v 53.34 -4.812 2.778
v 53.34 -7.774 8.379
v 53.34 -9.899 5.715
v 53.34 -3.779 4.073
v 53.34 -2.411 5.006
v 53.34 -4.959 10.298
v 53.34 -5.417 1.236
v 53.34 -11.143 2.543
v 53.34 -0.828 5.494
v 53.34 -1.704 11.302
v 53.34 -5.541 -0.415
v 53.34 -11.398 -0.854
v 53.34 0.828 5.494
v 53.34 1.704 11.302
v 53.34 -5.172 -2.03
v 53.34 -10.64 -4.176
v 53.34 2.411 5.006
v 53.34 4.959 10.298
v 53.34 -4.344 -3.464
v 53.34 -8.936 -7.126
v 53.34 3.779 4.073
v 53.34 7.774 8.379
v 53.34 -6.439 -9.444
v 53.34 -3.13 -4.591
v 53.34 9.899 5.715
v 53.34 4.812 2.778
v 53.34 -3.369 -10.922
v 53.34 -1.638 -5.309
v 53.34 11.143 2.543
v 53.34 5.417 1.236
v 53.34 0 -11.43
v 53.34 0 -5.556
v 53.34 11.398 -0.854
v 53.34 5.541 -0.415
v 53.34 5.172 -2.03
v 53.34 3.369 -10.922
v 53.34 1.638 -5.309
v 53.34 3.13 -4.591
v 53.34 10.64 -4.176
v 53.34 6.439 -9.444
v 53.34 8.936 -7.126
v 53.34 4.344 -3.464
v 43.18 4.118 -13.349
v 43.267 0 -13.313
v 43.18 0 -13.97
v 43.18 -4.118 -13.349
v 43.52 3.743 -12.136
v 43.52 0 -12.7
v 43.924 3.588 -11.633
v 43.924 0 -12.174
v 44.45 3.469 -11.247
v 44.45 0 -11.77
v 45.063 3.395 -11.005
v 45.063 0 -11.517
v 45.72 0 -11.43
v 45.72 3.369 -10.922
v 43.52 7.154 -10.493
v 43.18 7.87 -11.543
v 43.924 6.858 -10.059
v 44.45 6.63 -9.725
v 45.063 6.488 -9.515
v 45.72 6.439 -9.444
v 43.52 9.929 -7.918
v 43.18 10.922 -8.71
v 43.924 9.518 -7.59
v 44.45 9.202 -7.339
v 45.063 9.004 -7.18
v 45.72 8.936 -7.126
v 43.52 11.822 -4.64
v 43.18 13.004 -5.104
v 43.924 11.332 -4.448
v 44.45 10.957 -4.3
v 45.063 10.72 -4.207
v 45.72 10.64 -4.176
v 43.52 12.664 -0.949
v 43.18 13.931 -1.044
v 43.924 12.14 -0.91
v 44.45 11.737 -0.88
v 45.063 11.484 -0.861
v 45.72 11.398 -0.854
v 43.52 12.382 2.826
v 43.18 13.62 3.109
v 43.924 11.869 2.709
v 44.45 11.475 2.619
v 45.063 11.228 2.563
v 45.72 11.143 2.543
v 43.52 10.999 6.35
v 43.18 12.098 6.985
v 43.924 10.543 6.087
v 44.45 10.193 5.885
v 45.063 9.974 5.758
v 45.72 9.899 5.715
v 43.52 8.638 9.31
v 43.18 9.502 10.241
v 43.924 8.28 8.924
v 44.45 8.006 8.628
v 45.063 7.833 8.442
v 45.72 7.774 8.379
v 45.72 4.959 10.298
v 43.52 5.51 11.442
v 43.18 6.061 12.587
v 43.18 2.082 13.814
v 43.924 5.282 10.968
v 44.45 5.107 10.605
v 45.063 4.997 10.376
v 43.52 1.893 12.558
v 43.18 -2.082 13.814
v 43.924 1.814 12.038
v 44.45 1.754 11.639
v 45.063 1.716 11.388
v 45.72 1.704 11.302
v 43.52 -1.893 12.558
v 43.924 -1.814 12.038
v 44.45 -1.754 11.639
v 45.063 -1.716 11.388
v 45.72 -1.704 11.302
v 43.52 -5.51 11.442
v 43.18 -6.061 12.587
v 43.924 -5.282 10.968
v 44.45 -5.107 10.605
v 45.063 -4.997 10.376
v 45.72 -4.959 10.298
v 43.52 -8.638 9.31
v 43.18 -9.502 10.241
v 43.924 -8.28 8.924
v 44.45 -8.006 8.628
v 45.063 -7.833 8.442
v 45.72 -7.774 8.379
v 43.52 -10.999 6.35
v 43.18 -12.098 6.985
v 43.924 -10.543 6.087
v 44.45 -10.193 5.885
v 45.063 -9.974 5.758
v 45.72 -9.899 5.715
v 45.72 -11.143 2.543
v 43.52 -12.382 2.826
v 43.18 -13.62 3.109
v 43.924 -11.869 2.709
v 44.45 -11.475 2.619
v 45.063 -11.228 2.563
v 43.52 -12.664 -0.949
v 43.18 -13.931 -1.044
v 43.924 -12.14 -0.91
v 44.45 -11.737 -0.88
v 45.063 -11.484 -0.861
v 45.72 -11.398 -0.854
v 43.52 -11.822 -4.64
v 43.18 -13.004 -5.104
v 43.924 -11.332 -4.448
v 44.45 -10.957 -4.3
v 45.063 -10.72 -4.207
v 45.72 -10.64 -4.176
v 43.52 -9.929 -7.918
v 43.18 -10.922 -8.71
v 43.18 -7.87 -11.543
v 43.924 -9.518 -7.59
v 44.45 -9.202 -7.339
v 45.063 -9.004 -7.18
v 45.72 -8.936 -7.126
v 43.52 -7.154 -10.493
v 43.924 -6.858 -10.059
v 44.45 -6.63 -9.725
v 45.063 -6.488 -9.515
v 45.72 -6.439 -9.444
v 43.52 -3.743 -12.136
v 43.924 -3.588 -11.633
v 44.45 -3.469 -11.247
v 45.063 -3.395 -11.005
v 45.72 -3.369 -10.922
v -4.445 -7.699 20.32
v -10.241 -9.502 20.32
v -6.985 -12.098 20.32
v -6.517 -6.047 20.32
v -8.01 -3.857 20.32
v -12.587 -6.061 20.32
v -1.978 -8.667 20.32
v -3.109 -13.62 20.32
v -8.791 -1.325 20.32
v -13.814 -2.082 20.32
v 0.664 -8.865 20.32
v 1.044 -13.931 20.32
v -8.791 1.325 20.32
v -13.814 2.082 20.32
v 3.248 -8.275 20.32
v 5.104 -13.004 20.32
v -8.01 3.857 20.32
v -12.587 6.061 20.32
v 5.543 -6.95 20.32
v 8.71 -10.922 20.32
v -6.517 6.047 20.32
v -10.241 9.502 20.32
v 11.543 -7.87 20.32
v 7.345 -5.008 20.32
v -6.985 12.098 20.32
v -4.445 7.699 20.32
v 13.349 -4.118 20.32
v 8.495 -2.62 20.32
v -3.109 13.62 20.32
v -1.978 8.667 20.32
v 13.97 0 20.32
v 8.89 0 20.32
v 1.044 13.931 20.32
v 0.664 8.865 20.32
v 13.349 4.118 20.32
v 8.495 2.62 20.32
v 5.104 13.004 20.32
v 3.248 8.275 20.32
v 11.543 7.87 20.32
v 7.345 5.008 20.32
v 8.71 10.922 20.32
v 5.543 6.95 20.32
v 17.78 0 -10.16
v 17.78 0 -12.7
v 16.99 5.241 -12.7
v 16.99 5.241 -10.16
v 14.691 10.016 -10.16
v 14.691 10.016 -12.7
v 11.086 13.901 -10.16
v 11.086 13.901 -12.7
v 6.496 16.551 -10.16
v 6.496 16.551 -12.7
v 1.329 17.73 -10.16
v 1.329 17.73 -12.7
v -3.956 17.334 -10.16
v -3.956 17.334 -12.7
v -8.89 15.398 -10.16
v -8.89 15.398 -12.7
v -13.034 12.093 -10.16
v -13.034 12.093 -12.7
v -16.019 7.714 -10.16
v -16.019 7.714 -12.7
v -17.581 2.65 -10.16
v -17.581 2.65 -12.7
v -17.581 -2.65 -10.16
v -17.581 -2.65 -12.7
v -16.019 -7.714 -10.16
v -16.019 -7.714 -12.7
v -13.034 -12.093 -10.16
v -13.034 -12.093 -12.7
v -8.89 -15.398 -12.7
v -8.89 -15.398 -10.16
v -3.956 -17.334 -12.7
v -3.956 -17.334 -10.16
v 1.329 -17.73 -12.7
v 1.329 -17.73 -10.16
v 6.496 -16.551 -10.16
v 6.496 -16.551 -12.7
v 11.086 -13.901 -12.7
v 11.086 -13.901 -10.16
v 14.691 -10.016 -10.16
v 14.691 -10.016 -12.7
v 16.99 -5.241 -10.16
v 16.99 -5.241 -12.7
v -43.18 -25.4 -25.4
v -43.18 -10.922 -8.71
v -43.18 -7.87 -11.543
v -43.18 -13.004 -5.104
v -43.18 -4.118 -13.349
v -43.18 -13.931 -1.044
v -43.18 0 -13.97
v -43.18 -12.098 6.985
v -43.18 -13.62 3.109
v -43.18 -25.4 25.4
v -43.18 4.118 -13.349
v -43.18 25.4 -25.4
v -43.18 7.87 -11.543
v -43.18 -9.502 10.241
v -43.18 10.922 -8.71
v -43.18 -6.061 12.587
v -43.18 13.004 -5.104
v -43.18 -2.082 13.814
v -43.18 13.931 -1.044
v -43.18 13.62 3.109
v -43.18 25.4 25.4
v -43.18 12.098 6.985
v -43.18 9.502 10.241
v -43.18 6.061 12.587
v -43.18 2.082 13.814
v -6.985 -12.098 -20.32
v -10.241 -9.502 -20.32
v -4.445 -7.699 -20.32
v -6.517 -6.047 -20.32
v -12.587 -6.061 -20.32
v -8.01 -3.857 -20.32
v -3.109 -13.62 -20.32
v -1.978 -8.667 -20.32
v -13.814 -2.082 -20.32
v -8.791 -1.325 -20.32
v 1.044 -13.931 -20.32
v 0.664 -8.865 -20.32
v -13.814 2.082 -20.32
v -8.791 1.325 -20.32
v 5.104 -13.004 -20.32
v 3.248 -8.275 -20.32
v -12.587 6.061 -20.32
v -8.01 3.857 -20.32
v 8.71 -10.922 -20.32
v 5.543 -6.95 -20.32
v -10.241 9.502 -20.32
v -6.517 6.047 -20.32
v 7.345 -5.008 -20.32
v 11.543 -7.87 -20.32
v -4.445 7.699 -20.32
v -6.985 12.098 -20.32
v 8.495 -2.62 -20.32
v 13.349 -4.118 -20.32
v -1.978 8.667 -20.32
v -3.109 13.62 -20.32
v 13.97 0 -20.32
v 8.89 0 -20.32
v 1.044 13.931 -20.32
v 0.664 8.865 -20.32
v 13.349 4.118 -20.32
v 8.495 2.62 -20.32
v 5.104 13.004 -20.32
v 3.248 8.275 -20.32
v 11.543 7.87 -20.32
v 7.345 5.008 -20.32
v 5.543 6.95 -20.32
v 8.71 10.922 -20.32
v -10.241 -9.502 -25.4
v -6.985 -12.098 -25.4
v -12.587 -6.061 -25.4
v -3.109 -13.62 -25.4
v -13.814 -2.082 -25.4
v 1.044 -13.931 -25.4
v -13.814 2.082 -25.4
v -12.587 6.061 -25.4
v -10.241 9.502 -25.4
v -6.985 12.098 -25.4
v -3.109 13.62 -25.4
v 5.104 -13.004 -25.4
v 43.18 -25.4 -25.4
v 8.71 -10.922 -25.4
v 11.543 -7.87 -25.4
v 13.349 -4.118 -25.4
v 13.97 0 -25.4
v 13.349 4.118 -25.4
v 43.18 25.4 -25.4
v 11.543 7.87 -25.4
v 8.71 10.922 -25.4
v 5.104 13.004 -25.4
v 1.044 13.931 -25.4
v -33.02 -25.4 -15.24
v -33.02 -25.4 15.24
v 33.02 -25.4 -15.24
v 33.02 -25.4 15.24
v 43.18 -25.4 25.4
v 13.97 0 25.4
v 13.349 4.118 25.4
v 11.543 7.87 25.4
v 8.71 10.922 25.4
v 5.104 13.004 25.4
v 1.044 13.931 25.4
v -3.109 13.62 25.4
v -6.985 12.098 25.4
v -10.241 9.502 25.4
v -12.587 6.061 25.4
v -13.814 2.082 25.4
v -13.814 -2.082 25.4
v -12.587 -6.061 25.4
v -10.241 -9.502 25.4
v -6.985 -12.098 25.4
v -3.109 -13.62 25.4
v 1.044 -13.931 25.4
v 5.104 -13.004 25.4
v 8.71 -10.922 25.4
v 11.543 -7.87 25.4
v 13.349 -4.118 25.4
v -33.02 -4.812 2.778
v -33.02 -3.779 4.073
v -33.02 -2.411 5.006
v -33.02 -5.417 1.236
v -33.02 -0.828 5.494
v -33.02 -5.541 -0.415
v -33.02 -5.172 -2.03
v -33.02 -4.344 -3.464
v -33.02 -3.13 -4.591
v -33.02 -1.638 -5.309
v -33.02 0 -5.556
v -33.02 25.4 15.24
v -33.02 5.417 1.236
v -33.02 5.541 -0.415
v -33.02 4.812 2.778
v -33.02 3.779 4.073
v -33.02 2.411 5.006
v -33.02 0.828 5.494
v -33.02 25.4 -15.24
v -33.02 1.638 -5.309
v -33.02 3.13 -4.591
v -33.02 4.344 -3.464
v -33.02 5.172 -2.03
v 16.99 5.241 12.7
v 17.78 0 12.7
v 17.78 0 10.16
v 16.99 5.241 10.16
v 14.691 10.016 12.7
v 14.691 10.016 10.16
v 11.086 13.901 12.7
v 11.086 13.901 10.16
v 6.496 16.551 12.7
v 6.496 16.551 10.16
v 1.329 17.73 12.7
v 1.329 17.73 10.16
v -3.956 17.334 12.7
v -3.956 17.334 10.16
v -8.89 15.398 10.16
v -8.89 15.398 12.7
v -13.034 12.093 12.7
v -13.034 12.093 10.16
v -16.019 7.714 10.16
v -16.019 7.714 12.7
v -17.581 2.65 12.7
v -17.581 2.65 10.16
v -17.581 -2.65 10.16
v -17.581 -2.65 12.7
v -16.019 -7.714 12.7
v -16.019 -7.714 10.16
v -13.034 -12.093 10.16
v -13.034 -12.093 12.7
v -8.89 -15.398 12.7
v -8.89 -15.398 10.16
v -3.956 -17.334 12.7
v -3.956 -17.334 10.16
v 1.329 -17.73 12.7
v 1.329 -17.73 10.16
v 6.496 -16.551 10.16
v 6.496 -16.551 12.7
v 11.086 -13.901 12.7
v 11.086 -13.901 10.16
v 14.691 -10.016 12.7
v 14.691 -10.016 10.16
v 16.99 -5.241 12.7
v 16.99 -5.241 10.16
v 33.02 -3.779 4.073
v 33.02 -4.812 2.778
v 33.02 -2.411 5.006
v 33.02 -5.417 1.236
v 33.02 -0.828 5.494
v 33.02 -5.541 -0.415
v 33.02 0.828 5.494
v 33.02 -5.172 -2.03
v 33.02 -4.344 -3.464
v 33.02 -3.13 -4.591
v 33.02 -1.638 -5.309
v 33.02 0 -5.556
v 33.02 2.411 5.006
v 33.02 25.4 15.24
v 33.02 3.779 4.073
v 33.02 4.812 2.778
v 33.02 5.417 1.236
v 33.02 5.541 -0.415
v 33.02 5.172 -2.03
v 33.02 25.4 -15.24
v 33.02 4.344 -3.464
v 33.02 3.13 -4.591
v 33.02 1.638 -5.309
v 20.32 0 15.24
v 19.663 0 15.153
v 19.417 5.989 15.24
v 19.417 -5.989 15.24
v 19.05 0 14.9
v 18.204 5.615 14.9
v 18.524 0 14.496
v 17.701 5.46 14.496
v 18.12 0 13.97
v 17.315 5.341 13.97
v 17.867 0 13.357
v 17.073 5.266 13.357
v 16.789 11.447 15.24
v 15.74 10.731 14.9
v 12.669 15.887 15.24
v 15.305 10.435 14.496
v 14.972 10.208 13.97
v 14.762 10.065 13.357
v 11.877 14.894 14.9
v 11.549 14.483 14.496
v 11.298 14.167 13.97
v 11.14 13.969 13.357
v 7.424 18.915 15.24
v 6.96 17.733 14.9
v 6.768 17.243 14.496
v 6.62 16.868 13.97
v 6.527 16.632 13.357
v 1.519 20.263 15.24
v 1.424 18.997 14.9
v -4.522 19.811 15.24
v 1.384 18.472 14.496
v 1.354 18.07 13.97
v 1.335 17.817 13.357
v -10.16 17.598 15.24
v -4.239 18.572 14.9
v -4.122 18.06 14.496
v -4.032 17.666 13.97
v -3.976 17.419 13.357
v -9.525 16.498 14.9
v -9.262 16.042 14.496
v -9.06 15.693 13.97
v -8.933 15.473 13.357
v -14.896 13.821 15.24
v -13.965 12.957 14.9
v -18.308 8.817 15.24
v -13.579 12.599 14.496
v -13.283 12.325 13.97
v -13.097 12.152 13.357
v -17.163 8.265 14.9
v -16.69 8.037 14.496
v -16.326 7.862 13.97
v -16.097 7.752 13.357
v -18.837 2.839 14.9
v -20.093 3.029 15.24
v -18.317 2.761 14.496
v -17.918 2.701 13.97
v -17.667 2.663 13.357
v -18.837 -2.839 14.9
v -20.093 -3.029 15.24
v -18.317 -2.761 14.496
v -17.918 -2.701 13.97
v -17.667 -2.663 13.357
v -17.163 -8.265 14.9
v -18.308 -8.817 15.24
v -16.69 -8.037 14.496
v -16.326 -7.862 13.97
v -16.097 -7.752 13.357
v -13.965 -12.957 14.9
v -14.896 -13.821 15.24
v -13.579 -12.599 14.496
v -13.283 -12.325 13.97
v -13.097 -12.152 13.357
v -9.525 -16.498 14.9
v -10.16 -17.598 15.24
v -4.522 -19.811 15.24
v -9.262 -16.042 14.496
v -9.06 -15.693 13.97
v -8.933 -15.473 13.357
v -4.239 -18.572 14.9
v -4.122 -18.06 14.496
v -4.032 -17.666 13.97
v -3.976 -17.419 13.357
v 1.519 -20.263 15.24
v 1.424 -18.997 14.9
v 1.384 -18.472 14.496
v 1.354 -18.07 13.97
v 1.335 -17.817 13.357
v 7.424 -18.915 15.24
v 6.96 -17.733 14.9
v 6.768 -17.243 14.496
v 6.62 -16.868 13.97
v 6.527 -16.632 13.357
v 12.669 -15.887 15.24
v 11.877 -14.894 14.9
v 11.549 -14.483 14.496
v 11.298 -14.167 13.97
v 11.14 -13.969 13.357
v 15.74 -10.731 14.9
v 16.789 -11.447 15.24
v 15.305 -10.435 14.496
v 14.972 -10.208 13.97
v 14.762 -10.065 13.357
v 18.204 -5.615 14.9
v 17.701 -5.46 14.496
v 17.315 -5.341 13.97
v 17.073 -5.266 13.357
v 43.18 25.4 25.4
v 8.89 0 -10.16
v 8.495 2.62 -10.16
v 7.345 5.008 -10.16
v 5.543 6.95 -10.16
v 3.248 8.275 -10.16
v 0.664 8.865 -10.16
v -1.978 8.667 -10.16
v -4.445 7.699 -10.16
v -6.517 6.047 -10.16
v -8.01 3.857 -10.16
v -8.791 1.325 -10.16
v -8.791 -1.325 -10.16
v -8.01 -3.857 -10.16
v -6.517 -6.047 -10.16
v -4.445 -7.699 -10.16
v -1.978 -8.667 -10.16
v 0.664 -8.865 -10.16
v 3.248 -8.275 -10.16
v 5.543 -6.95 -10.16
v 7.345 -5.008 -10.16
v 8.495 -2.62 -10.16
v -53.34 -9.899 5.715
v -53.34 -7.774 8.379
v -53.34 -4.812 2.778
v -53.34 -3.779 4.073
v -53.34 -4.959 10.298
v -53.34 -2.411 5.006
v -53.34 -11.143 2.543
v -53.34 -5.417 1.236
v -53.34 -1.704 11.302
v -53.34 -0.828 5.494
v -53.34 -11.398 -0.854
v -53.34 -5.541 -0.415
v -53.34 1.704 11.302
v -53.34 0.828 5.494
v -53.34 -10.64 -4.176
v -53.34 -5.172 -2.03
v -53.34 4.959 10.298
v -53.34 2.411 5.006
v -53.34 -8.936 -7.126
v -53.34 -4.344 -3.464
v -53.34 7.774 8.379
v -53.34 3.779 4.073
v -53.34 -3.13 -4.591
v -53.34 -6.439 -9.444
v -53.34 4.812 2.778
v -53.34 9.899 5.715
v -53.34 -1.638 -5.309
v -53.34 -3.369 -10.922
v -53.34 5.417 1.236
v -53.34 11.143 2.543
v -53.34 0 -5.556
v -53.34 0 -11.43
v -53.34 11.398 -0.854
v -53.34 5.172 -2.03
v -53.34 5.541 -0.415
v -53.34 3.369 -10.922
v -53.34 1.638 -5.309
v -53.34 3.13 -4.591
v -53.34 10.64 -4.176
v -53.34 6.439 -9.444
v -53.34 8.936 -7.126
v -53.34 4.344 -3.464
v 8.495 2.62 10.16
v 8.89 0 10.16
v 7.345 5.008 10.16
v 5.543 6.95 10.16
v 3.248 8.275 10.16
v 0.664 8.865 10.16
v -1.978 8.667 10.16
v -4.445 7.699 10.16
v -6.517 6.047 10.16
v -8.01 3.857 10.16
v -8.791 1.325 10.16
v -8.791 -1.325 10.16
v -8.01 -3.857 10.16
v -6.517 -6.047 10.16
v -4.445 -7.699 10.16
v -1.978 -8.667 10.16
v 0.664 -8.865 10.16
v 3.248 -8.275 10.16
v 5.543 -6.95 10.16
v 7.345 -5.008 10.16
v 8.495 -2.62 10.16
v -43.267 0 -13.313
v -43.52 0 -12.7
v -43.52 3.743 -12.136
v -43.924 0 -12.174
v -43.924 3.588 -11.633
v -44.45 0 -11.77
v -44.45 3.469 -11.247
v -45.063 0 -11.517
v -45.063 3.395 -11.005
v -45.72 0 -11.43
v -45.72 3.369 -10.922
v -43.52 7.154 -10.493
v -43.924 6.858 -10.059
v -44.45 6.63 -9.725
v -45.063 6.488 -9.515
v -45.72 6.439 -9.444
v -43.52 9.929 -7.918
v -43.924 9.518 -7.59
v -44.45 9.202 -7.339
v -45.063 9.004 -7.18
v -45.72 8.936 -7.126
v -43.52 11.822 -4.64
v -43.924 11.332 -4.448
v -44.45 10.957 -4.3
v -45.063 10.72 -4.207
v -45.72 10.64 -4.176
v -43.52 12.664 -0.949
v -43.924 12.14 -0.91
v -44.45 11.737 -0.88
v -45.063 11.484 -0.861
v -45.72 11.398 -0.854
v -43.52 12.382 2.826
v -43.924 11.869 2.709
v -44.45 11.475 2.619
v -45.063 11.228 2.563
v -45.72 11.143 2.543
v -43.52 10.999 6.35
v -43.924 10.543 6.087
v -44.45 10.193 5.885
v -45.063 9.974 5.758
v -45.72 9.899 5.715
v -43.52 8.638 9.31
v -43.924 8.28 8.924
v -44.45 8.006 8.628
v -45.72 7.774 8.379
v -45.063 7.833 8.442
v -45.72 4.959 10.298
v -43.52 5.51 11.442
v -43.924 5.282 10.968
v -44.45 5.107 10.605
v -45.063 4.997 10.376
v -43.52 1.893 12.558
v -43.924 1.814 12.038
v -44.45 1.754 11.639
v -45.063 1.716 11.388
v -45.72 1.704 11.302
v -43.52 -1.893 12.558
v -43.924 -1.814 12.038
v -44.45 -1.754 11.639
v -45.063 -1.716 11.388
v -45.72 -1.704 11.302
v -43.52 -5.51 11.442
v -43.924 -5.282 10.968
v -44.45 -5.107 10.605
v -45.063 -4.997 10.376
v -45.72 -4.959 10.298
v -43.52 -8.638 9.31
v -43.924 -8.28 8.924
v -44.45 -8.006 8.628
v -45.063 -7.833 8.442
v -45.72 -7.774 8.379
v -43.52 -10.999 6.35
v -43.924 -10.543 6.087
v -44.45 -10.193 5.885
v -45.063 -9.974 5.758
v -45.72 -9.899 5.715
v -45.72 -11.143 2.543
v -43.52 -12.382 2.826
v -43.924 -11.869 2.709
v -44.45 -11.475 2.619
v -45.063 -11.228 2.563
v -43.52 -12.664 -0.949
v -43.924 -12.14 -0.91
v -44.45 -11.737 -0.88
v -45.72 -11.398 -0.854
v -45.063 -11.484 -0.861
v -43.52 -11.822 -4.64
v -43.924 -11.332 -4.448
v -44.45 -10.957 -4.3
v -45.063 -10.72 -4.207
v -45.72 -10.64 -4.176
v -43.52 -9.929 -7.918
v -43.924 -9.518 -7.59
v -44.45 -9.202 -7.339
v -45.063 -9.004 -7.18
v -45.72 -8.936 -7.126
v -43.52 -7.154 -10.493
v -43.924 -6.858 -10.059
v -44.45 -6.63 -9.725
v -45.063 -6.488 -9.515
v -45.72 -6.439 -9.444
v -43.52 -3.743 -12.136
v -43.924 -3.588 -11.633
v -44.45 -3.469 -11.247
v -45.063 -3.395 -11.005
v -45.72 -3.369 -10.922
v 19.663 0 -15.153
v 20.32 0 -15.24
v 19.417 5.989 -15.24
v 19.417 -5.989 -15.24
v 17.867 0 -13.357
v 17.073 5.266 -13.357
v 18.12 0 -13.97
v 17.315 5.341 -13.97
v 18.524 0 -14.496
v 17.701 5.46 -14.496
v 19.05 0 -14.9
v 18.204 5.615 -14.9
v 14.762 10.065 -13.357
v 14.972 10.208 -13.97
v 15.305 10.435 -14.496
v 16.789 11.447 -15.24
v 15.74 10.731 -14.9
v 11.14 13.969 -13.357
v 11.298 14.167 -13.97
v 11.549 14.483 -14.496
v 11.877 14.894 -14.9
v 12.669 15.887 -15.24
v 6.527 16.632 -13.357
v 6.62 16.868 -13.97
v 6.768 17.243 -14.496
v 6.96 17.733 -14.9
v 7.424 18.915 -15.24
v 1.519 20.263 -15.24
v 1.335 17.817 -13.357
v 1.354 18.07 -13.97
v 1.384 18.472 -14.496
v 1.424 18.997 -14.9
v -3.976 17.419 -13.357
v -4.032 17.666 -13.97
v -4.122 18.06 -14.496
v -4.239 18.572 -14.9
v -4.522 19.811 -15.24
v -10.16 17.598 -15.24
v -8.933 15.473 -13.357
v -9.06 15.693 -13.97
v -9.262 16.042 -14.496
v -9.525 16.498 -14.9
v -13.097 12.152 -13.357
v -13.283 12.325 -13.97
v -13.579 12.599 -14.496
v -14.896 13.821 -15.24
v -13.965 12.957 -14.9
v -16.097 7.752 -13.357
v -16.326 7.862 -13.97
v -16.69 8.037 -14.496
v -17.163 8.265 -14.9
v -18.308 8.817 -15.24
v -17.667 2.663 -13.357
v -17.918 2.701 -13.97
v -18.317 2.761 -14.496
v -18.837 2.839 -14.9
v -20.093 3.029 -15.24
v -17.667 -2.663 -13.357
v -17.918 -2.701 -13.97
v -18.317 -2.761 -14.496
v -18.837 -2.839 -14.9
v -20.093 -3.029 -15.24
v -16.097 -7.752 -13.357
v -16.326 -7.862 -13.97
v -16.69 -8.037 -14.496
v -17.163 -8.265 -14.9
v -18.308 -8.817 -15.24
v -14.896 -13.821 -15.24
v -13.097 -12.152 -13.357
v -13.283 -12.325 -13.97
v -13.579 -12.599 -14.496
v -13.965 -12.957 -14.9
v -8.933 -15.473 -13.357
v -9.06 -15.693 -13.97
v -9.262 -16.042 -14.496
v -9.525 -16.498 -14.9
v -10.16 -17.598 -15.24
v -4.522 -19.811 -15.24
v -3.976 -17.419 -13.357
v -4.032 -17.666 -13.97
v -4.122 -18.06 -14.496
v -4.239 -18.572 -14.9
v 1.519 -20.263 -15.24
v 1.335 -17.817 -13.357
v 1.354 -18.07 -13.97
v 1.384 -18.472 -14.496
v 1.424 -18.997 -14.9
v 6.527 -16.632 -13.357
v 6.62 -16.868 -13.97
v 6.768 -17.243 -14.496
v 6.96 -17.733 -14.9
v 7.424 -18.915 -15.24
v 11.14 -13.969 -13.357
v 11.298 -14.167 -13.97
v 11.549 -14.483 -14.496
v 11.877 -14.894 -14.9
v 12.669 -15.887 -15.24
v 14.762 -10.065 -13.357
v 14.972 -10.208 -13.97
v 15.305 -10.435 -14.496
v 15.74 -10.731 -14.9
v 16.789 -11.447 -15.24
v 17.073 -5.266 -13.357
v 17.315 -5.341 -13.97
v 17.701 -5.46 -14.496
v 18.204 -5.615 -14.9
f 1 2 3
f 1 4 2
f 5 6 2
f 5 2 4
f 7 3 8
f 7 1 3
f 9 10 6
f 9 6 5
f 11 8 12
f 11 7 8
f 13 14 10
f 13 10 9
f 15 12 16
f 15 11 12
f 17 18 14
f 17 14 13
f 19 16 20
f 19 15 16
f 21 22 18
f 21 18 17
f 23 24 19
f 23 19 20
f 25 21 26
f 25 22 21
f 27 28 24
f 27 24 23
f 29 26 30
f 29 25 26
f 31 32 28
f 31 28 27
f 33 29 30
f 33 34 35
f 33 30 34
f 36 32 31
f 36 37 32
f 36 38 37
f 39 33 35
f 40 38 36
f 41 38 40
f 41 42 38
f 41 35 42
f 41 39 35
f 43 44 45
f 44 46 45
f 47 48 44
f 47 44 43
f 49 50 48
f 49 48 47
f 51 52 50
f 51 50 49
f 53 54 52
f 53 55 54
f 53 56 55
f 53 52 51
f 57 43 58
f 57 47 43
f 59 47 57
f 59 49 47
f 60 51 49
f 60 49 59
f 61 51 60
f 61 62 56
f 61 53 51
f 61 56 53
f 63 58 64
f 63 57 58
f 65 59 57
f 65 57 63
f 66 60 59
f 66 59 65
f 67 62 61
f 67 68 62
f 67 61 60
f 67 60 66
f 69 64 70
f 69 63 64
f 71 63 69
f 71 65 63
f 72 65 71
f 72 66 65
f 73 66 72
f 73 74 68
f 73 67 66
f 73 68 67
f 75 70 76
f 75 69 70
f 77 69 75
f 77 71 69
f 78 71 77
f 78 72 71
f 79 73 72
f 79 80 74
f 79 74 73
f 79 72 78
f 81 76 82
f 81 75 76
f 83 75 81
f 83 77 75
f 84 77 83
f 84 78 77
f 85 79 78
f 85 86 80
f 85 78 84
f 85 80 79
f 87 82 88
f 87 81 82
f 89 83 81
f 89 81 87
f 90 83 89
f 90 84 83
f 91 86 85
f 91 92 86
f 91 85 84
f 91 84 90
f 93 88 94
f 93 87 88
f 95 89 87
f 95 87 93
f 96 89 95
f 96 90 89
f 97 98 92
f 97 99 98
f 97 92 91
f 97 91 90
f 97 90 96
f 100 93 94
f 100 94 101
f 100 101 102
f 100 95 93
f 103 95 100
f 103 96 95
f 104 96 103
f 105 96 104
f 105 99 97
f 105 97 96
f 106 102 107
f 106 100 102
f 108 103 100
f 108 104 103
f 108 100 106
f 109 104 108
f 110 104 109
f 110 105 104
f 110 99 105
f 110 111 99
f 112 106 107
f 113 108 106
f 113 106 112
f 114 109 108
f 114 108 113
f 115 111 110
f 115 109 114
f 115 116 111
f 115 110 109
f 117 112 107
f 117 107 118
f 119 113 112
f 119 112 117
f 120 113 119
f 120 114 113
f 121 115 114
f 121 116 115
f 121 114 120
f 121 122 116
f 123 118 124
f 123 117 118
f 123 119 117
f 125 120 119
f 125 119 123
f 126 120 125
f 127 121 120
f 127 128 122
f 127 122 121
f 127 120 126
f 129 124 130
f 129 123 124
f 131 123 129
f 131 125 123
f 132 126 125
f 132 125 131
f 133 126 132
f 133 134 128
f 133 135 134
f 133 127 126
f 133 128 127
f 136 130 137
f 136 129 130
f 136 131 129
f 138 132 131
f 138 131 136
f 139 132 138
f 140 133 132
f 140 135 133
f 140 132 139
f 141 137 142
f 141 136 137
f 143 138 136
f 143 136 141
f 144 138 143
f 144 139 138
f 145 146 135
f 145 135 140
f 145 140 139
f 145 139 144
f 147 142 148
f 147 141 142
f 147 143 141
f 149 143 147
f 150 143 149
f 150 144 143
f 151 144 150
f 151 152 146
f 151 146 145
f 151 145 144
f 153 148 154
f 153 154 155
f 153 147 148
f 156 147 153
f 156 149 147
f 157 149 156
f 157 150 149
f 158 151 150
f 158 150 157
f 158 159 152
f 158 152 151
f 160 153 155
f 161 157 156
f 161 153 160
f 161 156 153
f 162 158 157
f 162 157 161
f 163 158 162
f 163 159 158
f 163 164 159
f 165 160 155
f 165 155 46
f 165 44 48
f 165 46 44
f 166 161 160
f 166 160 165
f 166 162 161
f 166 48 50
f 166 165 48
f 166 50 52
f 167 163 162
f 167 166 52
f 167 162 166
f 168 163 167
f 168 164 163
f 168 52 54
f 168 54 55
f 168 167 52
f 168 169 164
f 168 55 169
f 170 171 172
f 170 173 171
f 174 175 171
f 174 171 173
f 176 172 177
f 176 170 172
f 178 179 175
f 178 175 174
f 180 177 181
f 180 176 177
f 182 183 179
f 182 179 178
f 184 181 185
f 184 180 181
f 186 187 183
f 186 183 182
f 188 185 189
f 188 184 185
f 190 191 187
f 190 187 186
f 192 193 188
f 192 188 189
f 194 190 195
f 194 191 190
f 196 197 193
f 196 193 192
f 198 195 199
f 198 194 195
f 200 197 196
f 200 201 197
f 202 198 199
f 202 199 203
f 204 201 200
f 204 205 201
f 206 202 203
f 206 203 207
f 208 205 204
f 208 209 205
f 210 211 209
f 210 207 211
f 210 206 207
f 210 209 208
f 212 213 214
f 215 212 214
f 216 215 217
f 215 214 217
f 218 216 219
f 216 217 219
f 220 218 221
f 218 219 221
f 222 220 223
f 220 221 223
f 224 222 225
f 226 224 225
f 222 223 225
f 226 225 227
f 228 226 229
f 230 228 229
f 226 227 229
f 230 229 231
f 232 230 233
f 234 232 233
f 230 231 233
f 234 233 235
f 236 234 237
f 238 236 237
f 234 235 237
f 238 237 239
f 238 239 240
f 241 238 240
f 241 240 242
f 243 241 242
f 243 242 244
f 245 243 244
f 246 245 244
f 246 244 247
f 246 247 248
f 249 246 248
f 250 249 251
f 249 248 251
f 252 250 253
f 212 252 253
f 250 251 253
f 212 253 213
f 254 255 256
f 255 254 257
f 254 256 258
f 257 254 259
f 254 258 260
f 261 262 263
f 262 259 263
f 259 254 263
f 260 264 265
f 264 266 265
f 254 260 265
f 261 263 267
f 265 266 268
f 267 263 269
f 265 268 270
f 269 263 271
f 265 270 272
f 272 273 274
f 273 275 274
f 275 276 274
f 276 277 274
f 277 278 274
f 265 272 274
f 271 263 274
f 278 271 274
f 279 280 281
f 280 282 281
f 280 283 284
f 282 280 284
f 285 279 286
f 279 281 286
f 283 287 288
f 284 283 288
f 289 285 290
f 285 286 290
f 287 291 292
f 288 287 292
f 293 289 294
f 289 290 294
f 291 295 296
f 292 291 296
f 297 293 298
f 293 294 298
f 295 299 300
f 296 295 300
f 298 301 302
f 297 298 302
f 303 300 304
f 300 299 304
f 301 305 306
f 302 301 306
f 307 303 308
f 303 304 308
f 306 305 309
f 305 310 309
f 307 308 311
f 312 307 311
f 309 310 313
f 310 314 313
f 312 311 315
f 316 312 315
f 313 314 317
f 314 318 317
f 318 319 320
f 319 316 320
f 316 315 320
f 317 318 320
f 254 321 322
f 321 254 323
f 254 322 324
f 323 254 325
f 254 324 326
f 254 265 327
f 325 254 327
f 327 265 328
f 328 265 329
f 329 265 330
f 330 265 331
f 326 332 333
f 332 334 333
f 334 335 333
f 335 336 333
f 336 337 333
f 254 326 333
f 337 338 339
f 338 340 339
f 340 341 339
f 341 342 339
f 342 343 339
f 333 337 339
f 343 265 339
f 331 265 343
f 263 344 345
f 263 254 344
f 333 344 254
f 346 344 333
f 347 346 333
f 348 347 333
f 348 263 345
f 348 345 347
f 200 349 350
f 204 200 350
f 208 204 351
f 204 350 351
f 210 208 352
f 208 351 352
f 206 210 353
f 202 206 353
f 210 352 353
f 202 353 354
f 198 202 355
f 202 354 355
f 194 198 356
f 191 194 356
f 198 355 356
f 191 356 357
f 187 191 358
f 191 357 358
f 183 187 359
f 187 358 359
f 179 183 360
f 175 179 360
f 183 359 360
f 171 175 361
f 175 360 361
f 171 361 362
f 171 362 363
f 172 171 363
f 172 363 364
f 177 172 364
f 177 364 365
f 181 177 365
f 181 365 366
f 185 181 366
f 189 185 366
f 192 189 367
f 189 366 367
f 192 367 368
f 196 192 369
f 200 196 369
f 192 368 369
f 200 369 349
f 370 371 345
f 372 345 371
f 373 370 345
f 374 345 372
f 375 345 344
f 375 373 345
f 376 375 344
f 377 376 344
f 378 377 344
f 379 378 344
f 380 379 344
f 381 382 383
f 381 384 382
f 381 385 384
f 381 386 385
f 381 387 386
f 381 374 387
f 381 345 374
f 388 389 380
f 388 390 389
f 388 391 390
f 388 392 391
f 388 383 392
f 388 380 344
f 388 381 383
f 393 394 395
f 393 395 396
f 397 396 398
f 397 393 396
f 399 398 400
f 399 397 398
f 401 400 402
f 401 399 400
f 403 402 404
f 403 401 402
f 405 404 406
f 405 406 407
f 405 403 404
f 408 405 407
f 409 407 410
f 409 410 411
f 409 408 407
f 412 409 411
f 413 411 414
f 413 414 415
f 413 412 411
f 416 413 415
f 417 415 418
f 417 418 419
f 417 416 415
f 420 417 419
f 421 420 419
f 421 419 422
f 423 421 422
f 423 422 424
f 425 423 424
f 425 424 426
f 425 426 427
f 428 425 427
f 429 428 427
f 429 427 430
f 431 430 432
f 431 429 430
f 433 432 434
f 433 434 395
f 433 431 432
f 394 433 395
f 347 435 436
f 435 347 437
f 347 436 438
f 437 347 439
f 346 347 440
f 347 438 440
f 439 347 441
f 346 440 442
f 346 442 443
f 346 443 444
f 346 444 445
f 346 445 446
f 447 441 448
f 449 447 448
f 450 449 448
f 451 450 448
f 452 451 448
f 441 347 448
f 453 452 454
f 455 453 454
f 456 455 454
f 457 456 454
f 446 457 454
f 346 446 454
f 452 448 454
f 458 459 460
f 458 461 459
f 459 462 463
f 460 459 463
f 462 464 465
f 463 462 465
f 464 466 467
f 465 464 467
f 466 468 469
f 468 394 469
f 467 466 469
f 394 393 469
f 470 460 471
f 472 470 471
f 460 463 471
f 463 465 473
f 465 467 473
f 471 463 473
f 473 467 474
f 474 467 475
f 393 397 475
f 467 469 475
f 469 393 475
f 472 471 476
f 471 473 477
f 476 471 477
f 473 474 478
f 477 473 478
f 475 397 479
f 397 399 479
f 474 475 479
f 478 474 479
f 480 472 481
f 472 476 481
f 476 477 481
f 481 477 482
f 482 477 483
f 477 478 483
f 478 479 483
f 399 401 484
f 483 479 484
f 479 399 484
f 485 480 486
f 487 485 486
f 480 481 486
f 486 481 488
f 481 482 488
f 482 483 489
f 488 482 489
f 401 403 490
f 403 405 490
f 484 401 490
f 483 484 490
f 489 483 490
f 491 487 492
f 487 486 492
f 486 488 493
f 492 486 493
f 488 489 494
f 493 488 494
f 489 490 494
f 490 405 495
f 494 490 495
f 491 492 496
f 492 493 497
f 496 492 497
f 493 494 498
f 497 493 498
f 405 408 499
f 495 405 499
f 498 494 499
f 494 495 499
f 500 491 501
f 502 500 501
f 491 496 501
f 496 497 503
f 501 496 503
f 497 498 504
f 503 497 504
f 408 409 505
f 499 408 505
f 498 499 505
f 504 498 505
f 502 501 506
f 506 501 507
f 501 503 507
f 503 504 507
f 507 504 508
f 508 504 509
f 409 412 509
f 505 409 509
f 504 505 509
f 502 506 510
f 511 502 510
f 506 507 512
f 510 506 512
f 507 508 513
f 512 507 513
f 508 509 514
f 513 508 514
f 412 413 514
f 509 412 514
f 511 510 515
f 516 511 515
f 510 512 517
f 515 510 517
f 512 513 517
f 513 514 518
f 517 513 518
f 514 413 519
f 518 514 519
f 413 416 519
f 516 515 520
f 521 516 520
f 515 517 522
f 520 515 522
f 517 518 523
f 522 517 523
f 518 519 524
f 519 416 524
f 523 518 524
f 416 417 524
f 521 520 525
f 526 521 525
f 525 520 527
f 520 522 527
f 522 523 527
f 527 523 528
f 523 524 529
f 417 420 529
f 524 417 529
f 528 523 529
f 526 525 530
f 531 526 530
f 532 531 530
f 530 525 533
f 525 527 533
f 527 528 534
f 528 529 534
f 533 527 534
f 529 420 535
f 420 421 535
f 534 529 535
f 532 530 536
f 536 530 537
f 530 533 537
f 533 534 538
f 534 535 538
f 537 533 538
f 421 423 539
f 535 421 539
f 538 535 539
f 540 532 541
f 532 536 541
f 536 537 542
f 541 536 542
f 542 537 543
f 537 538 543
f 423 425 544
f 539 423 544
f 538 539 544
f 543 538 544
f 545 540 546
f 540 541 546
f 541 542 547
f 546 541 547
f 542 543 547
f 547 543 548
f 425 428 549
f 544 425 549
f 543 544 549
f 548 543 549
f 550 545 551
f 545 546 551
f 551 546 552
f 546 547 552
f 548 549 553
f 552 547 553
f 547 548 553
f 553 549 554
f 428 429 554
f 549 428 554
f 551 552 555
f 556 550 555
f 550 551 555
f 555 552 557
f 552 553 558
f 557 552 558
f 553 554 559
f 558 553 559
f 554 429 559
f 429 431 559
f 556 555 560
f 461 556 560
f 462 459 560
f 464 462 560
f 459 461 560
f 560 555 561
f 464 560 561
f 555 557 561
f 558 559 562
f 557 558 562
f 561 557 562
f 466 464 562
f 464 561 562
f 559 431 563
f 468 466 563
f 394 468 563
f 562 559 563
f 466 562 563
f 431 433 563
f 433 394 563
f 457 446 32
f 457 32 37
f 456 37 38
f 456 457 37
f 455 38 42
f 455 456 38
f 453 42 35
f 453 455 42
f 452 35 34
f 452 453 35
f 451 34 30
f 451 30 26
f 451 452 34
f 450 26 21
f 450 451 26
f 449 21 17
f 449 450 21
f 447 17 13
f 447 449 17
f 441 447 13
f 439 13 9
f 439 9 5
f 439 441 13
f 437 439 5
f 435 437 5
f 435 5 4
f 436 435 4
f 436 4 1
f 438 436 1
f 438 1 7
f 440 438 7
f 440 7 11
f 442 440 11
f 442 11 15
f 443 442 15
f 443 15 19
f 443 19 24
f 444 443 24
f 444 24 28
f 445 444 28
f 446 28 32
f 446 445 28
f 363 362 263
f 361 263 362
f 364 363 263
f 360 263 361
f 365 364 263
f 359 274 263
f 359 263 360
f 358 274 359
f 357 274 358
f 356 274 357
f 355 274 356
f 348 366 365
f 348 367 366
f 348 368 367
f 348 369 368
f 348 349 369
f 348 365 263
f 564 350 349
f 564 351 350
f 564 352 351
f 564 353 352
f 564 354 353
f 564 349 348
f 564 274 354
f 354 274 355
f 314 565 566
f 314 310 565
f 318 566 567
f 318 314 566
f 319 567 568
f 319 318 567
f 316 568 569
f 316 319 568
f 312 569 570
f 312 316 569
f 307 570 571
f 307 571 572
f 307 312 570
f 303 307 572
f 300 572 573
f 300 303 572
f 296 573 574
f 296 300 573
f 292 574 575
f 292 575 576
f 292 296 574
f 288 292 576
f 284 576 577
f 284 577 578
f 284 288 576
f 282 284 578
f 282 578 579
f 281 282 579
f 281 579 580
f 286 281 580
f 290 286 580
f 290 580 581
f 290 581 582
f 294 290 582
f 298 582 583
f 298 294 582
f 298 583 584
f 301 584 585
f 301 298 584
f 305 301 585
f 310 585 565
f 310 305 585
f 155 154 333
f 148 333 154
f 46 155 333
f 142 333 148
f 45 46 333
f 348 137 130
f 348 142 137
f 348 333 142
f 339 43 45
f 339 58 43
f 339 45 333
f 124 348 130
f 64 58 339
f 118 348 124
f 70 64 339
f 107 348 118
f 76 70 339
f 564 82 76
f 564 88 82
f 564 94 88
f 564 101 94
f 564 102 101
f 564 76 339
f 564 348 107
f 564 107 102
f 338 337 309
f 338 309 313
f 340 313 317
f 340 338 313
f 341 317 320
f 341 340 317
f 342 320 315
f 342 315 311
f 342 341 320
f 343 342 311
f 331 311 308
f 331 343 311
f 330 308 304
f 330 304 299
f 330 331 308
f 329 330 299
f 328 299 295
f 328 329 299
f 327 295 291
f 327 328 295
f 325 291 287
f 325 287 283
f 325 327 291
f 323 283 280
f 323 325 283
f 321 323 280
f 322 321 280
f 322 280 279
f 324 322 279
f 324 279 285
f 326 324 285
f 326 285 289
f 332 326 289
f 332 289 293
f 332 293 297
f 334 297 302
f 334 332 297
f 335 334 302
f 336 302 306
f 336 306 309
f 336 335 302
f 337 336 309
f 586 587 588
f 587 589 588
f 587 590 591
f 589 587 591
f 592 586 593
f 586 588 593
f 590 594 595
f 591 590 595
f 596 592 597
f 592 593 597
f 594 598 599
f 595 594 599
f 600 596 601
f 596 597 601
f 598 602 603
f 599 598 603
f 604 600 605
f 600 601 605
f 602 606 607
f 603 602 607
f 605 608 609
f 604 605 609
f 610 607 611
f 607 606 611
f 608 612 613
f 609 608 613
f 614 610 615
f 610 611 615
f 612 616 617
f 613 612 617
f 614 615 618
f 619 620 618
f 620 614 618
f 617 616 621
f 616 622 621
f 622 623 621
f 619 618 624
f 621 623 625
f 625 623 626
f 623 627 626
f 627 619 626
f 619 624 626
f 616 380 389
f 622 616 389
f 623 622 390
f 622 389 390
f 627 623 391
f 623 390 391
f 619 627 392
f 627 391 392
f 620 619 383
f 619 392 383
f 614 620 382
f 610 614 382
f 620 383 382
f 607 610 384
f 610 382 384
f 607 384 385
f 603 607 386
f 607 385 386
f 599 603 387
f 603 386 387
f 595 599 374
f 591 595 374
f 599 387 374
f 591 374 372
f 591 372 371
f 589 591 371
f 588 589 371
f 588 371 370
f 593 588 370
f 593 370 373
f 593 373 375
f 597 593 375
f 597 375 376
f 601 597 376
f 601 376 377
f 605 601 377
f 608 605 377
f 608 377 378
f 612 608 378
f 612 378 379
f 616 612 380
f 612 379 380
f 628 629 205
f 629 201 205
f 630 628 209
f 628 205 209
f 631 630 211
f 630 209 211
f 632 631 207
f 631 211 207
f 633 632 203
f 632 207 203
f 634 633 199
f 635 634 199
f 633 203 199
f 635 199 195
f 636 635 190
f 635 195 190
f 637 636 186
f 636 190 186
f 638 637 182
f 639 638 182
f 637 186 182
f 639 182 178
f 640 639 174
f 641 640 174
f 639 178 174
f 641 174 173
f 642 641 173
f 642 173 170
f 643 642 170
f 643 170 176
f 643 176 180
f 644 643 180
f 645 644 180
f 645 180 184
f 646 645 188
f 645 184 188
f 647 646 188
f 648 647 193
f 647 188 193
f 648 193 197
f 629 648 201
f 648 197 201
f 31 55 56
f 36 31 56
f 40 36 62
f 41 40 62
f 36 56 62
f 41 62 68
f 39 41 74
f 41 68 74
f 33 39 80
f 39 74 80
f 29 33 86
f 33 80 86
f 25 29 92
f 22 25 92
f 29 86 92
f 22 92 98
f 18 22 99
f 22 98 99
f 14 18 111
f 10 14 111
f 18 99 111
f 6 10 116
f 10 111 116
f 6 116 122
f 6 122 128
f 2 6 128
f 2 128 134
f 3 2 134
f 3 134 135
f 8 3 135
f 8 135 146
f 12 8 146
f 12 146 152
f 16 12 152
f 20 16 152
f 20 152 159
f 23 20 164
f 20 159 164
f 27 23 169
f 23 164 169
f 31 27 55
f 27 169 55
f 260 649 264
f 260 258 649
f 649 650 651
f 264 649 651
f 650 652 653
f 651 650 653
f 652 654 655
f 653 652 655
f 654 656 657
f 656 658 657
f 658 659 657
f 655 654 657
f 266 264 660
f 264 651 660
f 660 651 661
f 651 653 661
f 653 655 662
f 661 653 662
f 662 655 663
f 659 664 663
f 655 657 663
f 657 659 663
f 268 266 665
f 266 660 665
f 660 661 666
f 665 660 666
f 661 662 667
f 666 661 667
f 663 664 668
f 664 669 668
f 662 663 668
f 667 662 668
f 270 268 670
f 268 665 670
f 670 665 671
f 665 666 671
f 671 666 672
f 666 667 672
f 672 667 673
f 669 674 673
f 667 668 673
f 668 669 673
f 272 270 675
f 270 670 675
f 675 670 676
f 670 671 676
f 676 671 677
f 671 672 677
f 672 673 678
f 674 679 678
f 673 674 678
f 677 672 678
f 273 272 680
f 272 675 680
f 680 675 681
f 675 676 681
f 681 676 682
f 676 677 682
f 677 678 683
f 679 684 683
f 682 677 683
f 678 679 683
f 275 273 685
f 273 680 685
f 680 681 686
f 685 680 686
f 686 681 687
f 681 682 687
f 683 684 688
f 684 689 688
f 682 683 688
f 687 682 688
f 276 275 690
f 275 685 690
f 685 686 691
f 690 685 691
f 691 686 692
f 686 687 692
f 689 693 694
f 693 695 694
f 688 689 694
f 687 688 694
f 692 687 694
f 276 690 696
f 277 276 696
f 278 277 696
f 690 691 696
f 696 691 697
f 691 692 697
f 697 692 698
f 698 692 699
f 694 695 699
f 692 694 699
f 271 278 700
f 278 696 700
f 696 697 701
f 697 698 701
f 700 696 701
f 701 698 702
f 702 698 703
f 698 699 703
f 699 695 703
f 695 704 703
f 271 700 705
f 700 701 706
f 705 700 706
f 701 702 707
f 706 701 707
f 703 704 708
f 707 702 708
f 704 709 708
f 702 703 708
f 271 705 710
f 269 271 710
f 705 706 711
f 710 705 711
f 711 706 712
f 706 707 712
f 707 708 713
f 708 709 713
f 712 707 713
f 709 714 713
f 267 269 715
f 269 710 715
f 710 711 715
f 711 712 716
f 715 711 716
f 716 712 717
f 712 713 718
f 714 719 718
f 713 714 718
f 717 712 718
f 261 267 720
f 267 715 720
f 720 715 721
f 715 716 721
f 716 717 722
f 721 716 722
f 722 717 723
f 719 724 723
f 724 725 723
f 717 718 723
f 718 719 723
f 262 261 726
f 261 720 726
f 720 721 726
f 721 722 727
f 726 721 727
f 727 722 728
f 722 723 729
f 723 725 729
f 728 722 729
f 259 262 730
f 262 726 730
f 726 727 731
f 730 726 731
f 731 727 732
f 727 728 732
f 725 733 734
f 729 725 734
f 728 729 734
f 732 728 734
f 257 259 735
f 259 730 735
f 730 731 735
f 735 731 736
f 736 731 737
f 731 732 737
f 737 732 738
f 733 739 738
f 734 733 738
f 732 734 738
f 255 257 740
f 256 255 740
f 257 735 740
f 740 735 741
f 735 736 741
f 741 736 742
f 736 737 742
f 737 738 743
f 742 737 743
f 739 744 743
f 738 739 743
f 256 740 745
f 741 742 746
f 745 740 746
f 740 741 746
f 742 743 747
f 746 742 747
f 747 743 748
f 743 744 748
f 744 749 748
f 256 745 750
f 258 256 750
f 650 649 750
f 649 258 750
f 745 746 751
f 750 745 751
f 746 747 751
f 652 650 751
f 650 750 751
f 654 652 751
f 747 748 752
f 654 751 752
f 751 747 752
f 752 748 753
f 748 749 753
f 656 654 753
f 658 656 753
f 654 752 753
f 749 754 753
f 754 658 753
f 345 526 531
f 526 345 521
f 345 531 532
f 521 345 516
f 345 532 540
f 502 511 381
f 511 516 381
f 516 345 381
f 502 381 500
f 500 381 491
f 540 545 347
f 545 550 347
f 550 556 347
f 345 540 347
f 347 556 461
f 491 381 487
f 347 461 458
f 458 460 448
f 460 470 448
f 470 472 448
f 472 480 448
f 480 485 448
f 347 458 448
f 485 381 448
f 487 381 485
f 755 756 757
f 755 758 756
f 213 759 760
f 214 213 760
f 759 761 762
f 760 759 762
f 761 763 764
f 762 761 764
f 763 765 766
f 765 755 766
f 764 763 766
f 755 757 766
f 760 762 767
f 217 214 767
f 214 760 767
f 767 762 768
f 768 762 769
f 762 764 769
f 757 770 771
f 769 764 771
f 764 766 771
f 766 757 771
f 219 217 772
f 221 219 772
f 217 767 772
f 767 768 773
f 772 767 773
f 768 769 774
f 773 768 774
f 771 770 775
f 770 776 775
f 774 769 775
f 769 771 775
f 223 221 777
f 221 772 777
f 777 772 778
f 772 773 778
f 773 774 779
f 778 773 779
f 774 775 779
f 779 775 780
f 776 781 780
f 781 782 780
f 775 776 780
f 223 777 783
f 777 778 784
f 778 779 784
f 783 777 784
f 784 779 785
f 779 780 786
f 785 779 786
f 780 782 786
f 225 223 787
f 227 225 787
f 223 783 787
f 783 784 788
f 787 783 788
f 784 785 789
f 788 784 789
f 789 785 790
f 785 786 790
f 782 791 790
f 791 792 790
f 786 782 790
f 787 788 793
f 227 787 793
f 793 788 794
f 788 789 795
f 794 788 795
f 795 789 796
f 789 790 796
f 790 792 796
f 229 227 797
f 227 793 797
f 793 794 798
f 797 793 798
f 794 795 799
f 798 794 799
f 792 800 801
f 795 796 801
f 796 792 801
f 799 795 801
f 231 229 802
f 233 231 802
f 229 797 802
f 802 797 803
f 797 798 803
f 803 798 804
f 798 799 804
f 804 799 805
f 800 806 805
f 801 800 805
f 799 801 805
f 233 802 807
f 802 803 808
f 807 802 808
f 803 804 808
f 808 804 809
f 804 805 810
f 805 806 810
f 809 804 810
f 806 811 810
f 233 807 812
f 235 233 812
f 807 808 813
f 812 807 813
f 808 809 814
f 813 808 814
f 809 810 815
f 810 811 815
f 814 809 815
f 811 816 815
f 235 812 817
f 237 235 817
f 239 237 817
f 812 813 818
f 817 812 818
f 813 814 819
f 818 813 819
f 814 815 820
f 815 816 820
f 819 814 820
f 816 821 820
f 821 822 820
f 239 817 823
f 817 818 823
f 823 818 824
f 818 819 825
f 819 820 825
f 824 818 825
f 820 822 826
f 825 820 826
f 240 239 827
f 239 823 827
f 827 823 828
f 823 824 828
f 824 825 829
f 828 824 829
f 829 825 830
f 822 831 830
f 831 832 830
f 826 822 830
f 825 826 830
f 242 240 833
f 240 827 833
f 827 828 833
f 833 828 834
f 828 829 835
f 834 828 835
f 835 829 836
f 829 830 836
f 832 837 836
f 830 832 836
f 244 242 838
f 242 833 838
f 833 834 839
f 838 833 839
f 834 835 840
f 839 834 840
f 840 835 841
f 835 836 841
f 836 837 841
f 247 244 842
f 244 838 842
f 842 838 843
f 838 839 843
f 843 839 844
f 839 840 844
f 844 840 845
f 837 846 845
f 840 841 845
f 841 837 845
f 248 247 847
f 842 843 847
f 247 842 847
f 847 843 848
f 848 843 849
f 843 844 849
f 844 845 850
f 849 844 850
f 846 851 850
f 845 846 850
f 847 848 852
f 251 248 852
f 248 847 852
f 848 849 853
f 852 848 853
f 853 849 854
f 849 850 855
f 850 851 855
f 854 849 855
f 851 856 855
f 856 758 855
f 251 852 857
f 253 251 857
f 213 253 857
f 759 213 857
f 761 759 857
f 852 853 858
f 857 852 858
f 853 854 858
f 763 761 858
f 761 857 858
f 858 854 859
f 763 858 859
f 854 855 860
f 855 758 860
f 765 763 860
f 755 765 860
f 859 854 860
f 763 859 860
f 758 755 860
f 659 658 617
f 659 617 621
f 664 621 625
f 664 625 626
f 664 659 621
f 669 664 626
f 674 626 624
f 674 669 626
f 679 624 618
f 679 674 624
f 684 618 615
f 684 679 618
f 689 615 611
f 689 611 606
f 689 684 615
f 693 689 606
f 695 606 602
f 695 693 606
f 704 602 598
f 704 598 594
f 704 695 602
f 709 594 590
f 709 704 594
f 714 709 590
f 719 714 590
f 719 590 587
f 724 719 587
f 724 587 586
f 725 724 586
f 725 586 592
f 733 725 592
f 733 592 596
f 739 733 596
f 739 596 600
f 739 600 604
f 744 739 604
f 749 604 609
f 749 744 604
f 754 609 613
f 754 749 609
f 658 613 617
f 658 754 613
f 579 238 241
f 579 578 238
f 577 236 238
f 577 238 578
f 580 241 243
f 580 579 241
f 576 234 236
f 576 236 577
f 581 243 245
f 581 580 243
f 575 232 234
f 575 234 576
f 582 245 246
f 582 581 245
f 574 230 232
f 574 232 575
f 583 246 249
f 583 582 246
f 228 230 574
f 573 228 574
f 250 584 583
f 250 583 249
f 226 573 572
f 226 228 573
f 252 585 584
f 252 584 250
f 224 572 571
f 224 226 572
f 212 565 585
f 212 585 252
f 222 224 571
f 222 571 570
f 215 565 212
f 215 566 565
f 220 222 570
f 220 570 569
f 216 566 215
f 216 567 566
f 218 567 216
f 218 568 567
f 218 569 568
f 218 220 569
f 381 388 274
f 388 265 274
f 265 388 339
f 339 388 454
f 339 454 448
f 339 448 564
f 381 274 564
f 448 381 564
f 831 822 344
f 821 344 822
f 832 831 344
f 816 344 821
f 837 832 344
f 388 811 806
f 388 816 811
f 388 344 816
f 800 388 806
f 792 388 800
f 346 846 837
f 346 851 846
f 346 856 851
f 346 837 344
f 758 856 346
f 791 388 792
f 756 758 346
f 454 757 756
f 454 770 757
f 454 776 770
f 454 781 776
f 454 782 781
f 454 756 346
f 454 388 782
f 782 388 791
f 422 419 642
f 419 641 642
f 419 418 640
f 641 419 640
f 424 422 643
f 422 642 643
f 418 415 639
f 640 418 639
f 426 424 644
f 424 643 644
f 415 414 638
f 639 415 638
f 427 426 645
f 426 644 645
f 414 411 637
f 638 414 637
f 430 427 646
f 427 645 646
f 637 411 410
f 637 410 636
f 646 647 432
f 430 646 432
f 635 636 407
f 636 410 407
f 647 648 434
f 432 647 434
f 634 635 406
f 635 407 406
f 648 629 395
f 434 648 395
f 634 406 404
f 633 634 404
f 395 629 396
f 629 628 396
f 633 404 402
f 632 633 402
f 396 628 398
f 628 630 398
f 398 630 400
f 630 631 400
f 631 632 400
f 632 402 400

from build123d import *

# Parameters (mm, degrees)
SKETCH1_W           = 86.36
SKETCH1_H           = 50.8
SKETCH1_R           = 8.89
BOSS_EXTRUDE2_DEPTH = 25.4
CUT_EXTRUDE2_START  = 25.4
SKETCH1_3_R         = 13.97
SKETCH1_3_R_2       = 8.89
CUT_EXTRUDE2_DEPTH  = 5.08
CUT_EXTRUDE4_START  = -25.4
SKETCH1_4_R         = 13.97
SKETCH1_4_R_2       = 8.89
CUT_EXTRUDE4_DEPTH  = 5.08
SKETCH3_R           = 11.43
SKETCH3_R_2         = 5.55625
BOSS_EXTRUDE3_DEPTH = 10.16
SKETCH3_2_R         = 5.55625
CUT_EXTRUDE5_DEPTH  = 97.52
SKETCH4_W           = 66.04
SKETCH4_H           = 30.48
CUT_EXTRUDE6_DEPTH  = 51.8
BOSS_EXTRUDE4_START = 15.24
SKETCH5_R           = 17.78
SKETCH5_R_2         = 8.89
BOSS_EXTRUDE4_DEPTH = 5.08
BOSS_EXTRUDE5_START = -15.24
SKETCH5_2_R         = 17.78
SKETCH5_2_R_2       = 8.89
BOSS_EXTRUDE5_DEPTH = 5.08
FILLET1_R           = 2.54
FILLET2_R           = 2.54


with BuildPart() as part:
    # Sketch1 → Boss-Extrude2 (new body, symmetric)
    with BuildSketch(Plane.XY):
        Rectangle(SKETCH1_W, SKETCH1_H)
        Circle(SKETCH1_R, mode=Mode.SUBTRACT)
    extrude(amount=BOSS_EXTRUDE2_DEPTH, both=True)

    # Sketch1<3> → Cut-Extrude2 (cut)
    with BuildSketch(Plane.XY.offset(CUT_EXTRUDE2_START)):
        Circle(SKETCH1_3_R)
        Circle(SKETCH1_3_R_2, mode=Mode.SUBTRACT)
    extrude(amount=-CUT_EXTRUDE2_DEPTH, mode=Mode.SUBTRACT)

    # Sketch1<4> → Cut-Extrude4 (cut)
    with BuildSketch(Plane.XY.offset(CUT_EXTRUDE4_START)):
        Circle(SKETCH1_4_R)
        Circle(SKETCH1_4_R_2, mode=Mode.SUBTRACT)
    extrude(amount=CUT_EXTRUDE4_DEPTH, mode=Mode.SUBTRACT)

    # Sketch3 → Boss-Extrude3 (add)
    with BuildSketch(Plane(origin=(43.18, 0, 0), x_dir=(0, 0, -1), z_dir=(1, 0, 0))):
        Circle(SKETCH3_R)
        Circle(SKETCH3_R_2, mode=Mode.SUBTRACT)
    boss_extrude3 = extrude(amount=BOSS_EXTRUDE3_DEPTH)

    # Mirror1: Boss-Extrude3 across plane
    add(boss_extrude3.mirror(Plane(origin=(0, 0, 0), x_dir=(0, 0, 1), z_dir=(1, 0, 0))))

    # Sketch3<2> → Cut-Extrude5 (cut, through all)
    with BuildSketch(Plane(origin=(43.18, 0, 0), x_dir=(0, 0, -1), z_dir=(1, 0, 0))):
        Circle(SKETCH3_2_R)
    extrude(amount=-CUT_EXTRUDE5_DEPTH, mode=Mode.SUBTRACT)

    # Sketch4 → Cut-Extrude6 (cut, through all)
    with BuildSketch(Plane(origin=(0, 25.4, 0), x_dir=(1, 0, 0), z_dir=(0, 1, 0))):
        Rectangle(SKETCH4_W, SKETCH4_H)
    extrude(amount=-CUT_EXTRUDE6_DEPTH, mode=Mode.SUBTRACT)

    # Sketch5 → Boss-Extrude4 (add)
    with BuildSketch(Plane.XY.offset(BOSS_EXTRUDE4_START)):
        Circle(SKETCH5_R)
        Circle(SKETCH5_R_2, mode=Mode.SUBTRACT)
    extrude(amount=-BOSS_EXTRUDE4_DEPTH)

    # Sketch5<2> → Boss-Extrude5 (add)
    with BuildSketch(Plane.XY.offset(BOSS_EXTRUDE5_START)):
        Circle(SKETCH5_2_R)
        Circle(SKETCH5_2_R_2, mode=Mode.SUBTRACT)
    extrude(amount=BOSS_EXTRUDE5_DEPTH)

    # Fillet1
    fillet1_edges = [part.edges().sort_by_distance(p)[0] for p in [
        (-17.78, 0, 15.24),
        (-17.78, 0, -15.24),
    ]]
    fillet(fillet1_edges, radius=FILLET1_R)

    # Fillet2
    fillet2_edges = [part.edges().sort_by_distance(p)[0] for p in [
        (43.18, 0, 11.43),
        (-43.18, 0, 11.43),
    ]]
    fillet(fillet2_edges, radius=FILLET2_R)


solid = part.part
